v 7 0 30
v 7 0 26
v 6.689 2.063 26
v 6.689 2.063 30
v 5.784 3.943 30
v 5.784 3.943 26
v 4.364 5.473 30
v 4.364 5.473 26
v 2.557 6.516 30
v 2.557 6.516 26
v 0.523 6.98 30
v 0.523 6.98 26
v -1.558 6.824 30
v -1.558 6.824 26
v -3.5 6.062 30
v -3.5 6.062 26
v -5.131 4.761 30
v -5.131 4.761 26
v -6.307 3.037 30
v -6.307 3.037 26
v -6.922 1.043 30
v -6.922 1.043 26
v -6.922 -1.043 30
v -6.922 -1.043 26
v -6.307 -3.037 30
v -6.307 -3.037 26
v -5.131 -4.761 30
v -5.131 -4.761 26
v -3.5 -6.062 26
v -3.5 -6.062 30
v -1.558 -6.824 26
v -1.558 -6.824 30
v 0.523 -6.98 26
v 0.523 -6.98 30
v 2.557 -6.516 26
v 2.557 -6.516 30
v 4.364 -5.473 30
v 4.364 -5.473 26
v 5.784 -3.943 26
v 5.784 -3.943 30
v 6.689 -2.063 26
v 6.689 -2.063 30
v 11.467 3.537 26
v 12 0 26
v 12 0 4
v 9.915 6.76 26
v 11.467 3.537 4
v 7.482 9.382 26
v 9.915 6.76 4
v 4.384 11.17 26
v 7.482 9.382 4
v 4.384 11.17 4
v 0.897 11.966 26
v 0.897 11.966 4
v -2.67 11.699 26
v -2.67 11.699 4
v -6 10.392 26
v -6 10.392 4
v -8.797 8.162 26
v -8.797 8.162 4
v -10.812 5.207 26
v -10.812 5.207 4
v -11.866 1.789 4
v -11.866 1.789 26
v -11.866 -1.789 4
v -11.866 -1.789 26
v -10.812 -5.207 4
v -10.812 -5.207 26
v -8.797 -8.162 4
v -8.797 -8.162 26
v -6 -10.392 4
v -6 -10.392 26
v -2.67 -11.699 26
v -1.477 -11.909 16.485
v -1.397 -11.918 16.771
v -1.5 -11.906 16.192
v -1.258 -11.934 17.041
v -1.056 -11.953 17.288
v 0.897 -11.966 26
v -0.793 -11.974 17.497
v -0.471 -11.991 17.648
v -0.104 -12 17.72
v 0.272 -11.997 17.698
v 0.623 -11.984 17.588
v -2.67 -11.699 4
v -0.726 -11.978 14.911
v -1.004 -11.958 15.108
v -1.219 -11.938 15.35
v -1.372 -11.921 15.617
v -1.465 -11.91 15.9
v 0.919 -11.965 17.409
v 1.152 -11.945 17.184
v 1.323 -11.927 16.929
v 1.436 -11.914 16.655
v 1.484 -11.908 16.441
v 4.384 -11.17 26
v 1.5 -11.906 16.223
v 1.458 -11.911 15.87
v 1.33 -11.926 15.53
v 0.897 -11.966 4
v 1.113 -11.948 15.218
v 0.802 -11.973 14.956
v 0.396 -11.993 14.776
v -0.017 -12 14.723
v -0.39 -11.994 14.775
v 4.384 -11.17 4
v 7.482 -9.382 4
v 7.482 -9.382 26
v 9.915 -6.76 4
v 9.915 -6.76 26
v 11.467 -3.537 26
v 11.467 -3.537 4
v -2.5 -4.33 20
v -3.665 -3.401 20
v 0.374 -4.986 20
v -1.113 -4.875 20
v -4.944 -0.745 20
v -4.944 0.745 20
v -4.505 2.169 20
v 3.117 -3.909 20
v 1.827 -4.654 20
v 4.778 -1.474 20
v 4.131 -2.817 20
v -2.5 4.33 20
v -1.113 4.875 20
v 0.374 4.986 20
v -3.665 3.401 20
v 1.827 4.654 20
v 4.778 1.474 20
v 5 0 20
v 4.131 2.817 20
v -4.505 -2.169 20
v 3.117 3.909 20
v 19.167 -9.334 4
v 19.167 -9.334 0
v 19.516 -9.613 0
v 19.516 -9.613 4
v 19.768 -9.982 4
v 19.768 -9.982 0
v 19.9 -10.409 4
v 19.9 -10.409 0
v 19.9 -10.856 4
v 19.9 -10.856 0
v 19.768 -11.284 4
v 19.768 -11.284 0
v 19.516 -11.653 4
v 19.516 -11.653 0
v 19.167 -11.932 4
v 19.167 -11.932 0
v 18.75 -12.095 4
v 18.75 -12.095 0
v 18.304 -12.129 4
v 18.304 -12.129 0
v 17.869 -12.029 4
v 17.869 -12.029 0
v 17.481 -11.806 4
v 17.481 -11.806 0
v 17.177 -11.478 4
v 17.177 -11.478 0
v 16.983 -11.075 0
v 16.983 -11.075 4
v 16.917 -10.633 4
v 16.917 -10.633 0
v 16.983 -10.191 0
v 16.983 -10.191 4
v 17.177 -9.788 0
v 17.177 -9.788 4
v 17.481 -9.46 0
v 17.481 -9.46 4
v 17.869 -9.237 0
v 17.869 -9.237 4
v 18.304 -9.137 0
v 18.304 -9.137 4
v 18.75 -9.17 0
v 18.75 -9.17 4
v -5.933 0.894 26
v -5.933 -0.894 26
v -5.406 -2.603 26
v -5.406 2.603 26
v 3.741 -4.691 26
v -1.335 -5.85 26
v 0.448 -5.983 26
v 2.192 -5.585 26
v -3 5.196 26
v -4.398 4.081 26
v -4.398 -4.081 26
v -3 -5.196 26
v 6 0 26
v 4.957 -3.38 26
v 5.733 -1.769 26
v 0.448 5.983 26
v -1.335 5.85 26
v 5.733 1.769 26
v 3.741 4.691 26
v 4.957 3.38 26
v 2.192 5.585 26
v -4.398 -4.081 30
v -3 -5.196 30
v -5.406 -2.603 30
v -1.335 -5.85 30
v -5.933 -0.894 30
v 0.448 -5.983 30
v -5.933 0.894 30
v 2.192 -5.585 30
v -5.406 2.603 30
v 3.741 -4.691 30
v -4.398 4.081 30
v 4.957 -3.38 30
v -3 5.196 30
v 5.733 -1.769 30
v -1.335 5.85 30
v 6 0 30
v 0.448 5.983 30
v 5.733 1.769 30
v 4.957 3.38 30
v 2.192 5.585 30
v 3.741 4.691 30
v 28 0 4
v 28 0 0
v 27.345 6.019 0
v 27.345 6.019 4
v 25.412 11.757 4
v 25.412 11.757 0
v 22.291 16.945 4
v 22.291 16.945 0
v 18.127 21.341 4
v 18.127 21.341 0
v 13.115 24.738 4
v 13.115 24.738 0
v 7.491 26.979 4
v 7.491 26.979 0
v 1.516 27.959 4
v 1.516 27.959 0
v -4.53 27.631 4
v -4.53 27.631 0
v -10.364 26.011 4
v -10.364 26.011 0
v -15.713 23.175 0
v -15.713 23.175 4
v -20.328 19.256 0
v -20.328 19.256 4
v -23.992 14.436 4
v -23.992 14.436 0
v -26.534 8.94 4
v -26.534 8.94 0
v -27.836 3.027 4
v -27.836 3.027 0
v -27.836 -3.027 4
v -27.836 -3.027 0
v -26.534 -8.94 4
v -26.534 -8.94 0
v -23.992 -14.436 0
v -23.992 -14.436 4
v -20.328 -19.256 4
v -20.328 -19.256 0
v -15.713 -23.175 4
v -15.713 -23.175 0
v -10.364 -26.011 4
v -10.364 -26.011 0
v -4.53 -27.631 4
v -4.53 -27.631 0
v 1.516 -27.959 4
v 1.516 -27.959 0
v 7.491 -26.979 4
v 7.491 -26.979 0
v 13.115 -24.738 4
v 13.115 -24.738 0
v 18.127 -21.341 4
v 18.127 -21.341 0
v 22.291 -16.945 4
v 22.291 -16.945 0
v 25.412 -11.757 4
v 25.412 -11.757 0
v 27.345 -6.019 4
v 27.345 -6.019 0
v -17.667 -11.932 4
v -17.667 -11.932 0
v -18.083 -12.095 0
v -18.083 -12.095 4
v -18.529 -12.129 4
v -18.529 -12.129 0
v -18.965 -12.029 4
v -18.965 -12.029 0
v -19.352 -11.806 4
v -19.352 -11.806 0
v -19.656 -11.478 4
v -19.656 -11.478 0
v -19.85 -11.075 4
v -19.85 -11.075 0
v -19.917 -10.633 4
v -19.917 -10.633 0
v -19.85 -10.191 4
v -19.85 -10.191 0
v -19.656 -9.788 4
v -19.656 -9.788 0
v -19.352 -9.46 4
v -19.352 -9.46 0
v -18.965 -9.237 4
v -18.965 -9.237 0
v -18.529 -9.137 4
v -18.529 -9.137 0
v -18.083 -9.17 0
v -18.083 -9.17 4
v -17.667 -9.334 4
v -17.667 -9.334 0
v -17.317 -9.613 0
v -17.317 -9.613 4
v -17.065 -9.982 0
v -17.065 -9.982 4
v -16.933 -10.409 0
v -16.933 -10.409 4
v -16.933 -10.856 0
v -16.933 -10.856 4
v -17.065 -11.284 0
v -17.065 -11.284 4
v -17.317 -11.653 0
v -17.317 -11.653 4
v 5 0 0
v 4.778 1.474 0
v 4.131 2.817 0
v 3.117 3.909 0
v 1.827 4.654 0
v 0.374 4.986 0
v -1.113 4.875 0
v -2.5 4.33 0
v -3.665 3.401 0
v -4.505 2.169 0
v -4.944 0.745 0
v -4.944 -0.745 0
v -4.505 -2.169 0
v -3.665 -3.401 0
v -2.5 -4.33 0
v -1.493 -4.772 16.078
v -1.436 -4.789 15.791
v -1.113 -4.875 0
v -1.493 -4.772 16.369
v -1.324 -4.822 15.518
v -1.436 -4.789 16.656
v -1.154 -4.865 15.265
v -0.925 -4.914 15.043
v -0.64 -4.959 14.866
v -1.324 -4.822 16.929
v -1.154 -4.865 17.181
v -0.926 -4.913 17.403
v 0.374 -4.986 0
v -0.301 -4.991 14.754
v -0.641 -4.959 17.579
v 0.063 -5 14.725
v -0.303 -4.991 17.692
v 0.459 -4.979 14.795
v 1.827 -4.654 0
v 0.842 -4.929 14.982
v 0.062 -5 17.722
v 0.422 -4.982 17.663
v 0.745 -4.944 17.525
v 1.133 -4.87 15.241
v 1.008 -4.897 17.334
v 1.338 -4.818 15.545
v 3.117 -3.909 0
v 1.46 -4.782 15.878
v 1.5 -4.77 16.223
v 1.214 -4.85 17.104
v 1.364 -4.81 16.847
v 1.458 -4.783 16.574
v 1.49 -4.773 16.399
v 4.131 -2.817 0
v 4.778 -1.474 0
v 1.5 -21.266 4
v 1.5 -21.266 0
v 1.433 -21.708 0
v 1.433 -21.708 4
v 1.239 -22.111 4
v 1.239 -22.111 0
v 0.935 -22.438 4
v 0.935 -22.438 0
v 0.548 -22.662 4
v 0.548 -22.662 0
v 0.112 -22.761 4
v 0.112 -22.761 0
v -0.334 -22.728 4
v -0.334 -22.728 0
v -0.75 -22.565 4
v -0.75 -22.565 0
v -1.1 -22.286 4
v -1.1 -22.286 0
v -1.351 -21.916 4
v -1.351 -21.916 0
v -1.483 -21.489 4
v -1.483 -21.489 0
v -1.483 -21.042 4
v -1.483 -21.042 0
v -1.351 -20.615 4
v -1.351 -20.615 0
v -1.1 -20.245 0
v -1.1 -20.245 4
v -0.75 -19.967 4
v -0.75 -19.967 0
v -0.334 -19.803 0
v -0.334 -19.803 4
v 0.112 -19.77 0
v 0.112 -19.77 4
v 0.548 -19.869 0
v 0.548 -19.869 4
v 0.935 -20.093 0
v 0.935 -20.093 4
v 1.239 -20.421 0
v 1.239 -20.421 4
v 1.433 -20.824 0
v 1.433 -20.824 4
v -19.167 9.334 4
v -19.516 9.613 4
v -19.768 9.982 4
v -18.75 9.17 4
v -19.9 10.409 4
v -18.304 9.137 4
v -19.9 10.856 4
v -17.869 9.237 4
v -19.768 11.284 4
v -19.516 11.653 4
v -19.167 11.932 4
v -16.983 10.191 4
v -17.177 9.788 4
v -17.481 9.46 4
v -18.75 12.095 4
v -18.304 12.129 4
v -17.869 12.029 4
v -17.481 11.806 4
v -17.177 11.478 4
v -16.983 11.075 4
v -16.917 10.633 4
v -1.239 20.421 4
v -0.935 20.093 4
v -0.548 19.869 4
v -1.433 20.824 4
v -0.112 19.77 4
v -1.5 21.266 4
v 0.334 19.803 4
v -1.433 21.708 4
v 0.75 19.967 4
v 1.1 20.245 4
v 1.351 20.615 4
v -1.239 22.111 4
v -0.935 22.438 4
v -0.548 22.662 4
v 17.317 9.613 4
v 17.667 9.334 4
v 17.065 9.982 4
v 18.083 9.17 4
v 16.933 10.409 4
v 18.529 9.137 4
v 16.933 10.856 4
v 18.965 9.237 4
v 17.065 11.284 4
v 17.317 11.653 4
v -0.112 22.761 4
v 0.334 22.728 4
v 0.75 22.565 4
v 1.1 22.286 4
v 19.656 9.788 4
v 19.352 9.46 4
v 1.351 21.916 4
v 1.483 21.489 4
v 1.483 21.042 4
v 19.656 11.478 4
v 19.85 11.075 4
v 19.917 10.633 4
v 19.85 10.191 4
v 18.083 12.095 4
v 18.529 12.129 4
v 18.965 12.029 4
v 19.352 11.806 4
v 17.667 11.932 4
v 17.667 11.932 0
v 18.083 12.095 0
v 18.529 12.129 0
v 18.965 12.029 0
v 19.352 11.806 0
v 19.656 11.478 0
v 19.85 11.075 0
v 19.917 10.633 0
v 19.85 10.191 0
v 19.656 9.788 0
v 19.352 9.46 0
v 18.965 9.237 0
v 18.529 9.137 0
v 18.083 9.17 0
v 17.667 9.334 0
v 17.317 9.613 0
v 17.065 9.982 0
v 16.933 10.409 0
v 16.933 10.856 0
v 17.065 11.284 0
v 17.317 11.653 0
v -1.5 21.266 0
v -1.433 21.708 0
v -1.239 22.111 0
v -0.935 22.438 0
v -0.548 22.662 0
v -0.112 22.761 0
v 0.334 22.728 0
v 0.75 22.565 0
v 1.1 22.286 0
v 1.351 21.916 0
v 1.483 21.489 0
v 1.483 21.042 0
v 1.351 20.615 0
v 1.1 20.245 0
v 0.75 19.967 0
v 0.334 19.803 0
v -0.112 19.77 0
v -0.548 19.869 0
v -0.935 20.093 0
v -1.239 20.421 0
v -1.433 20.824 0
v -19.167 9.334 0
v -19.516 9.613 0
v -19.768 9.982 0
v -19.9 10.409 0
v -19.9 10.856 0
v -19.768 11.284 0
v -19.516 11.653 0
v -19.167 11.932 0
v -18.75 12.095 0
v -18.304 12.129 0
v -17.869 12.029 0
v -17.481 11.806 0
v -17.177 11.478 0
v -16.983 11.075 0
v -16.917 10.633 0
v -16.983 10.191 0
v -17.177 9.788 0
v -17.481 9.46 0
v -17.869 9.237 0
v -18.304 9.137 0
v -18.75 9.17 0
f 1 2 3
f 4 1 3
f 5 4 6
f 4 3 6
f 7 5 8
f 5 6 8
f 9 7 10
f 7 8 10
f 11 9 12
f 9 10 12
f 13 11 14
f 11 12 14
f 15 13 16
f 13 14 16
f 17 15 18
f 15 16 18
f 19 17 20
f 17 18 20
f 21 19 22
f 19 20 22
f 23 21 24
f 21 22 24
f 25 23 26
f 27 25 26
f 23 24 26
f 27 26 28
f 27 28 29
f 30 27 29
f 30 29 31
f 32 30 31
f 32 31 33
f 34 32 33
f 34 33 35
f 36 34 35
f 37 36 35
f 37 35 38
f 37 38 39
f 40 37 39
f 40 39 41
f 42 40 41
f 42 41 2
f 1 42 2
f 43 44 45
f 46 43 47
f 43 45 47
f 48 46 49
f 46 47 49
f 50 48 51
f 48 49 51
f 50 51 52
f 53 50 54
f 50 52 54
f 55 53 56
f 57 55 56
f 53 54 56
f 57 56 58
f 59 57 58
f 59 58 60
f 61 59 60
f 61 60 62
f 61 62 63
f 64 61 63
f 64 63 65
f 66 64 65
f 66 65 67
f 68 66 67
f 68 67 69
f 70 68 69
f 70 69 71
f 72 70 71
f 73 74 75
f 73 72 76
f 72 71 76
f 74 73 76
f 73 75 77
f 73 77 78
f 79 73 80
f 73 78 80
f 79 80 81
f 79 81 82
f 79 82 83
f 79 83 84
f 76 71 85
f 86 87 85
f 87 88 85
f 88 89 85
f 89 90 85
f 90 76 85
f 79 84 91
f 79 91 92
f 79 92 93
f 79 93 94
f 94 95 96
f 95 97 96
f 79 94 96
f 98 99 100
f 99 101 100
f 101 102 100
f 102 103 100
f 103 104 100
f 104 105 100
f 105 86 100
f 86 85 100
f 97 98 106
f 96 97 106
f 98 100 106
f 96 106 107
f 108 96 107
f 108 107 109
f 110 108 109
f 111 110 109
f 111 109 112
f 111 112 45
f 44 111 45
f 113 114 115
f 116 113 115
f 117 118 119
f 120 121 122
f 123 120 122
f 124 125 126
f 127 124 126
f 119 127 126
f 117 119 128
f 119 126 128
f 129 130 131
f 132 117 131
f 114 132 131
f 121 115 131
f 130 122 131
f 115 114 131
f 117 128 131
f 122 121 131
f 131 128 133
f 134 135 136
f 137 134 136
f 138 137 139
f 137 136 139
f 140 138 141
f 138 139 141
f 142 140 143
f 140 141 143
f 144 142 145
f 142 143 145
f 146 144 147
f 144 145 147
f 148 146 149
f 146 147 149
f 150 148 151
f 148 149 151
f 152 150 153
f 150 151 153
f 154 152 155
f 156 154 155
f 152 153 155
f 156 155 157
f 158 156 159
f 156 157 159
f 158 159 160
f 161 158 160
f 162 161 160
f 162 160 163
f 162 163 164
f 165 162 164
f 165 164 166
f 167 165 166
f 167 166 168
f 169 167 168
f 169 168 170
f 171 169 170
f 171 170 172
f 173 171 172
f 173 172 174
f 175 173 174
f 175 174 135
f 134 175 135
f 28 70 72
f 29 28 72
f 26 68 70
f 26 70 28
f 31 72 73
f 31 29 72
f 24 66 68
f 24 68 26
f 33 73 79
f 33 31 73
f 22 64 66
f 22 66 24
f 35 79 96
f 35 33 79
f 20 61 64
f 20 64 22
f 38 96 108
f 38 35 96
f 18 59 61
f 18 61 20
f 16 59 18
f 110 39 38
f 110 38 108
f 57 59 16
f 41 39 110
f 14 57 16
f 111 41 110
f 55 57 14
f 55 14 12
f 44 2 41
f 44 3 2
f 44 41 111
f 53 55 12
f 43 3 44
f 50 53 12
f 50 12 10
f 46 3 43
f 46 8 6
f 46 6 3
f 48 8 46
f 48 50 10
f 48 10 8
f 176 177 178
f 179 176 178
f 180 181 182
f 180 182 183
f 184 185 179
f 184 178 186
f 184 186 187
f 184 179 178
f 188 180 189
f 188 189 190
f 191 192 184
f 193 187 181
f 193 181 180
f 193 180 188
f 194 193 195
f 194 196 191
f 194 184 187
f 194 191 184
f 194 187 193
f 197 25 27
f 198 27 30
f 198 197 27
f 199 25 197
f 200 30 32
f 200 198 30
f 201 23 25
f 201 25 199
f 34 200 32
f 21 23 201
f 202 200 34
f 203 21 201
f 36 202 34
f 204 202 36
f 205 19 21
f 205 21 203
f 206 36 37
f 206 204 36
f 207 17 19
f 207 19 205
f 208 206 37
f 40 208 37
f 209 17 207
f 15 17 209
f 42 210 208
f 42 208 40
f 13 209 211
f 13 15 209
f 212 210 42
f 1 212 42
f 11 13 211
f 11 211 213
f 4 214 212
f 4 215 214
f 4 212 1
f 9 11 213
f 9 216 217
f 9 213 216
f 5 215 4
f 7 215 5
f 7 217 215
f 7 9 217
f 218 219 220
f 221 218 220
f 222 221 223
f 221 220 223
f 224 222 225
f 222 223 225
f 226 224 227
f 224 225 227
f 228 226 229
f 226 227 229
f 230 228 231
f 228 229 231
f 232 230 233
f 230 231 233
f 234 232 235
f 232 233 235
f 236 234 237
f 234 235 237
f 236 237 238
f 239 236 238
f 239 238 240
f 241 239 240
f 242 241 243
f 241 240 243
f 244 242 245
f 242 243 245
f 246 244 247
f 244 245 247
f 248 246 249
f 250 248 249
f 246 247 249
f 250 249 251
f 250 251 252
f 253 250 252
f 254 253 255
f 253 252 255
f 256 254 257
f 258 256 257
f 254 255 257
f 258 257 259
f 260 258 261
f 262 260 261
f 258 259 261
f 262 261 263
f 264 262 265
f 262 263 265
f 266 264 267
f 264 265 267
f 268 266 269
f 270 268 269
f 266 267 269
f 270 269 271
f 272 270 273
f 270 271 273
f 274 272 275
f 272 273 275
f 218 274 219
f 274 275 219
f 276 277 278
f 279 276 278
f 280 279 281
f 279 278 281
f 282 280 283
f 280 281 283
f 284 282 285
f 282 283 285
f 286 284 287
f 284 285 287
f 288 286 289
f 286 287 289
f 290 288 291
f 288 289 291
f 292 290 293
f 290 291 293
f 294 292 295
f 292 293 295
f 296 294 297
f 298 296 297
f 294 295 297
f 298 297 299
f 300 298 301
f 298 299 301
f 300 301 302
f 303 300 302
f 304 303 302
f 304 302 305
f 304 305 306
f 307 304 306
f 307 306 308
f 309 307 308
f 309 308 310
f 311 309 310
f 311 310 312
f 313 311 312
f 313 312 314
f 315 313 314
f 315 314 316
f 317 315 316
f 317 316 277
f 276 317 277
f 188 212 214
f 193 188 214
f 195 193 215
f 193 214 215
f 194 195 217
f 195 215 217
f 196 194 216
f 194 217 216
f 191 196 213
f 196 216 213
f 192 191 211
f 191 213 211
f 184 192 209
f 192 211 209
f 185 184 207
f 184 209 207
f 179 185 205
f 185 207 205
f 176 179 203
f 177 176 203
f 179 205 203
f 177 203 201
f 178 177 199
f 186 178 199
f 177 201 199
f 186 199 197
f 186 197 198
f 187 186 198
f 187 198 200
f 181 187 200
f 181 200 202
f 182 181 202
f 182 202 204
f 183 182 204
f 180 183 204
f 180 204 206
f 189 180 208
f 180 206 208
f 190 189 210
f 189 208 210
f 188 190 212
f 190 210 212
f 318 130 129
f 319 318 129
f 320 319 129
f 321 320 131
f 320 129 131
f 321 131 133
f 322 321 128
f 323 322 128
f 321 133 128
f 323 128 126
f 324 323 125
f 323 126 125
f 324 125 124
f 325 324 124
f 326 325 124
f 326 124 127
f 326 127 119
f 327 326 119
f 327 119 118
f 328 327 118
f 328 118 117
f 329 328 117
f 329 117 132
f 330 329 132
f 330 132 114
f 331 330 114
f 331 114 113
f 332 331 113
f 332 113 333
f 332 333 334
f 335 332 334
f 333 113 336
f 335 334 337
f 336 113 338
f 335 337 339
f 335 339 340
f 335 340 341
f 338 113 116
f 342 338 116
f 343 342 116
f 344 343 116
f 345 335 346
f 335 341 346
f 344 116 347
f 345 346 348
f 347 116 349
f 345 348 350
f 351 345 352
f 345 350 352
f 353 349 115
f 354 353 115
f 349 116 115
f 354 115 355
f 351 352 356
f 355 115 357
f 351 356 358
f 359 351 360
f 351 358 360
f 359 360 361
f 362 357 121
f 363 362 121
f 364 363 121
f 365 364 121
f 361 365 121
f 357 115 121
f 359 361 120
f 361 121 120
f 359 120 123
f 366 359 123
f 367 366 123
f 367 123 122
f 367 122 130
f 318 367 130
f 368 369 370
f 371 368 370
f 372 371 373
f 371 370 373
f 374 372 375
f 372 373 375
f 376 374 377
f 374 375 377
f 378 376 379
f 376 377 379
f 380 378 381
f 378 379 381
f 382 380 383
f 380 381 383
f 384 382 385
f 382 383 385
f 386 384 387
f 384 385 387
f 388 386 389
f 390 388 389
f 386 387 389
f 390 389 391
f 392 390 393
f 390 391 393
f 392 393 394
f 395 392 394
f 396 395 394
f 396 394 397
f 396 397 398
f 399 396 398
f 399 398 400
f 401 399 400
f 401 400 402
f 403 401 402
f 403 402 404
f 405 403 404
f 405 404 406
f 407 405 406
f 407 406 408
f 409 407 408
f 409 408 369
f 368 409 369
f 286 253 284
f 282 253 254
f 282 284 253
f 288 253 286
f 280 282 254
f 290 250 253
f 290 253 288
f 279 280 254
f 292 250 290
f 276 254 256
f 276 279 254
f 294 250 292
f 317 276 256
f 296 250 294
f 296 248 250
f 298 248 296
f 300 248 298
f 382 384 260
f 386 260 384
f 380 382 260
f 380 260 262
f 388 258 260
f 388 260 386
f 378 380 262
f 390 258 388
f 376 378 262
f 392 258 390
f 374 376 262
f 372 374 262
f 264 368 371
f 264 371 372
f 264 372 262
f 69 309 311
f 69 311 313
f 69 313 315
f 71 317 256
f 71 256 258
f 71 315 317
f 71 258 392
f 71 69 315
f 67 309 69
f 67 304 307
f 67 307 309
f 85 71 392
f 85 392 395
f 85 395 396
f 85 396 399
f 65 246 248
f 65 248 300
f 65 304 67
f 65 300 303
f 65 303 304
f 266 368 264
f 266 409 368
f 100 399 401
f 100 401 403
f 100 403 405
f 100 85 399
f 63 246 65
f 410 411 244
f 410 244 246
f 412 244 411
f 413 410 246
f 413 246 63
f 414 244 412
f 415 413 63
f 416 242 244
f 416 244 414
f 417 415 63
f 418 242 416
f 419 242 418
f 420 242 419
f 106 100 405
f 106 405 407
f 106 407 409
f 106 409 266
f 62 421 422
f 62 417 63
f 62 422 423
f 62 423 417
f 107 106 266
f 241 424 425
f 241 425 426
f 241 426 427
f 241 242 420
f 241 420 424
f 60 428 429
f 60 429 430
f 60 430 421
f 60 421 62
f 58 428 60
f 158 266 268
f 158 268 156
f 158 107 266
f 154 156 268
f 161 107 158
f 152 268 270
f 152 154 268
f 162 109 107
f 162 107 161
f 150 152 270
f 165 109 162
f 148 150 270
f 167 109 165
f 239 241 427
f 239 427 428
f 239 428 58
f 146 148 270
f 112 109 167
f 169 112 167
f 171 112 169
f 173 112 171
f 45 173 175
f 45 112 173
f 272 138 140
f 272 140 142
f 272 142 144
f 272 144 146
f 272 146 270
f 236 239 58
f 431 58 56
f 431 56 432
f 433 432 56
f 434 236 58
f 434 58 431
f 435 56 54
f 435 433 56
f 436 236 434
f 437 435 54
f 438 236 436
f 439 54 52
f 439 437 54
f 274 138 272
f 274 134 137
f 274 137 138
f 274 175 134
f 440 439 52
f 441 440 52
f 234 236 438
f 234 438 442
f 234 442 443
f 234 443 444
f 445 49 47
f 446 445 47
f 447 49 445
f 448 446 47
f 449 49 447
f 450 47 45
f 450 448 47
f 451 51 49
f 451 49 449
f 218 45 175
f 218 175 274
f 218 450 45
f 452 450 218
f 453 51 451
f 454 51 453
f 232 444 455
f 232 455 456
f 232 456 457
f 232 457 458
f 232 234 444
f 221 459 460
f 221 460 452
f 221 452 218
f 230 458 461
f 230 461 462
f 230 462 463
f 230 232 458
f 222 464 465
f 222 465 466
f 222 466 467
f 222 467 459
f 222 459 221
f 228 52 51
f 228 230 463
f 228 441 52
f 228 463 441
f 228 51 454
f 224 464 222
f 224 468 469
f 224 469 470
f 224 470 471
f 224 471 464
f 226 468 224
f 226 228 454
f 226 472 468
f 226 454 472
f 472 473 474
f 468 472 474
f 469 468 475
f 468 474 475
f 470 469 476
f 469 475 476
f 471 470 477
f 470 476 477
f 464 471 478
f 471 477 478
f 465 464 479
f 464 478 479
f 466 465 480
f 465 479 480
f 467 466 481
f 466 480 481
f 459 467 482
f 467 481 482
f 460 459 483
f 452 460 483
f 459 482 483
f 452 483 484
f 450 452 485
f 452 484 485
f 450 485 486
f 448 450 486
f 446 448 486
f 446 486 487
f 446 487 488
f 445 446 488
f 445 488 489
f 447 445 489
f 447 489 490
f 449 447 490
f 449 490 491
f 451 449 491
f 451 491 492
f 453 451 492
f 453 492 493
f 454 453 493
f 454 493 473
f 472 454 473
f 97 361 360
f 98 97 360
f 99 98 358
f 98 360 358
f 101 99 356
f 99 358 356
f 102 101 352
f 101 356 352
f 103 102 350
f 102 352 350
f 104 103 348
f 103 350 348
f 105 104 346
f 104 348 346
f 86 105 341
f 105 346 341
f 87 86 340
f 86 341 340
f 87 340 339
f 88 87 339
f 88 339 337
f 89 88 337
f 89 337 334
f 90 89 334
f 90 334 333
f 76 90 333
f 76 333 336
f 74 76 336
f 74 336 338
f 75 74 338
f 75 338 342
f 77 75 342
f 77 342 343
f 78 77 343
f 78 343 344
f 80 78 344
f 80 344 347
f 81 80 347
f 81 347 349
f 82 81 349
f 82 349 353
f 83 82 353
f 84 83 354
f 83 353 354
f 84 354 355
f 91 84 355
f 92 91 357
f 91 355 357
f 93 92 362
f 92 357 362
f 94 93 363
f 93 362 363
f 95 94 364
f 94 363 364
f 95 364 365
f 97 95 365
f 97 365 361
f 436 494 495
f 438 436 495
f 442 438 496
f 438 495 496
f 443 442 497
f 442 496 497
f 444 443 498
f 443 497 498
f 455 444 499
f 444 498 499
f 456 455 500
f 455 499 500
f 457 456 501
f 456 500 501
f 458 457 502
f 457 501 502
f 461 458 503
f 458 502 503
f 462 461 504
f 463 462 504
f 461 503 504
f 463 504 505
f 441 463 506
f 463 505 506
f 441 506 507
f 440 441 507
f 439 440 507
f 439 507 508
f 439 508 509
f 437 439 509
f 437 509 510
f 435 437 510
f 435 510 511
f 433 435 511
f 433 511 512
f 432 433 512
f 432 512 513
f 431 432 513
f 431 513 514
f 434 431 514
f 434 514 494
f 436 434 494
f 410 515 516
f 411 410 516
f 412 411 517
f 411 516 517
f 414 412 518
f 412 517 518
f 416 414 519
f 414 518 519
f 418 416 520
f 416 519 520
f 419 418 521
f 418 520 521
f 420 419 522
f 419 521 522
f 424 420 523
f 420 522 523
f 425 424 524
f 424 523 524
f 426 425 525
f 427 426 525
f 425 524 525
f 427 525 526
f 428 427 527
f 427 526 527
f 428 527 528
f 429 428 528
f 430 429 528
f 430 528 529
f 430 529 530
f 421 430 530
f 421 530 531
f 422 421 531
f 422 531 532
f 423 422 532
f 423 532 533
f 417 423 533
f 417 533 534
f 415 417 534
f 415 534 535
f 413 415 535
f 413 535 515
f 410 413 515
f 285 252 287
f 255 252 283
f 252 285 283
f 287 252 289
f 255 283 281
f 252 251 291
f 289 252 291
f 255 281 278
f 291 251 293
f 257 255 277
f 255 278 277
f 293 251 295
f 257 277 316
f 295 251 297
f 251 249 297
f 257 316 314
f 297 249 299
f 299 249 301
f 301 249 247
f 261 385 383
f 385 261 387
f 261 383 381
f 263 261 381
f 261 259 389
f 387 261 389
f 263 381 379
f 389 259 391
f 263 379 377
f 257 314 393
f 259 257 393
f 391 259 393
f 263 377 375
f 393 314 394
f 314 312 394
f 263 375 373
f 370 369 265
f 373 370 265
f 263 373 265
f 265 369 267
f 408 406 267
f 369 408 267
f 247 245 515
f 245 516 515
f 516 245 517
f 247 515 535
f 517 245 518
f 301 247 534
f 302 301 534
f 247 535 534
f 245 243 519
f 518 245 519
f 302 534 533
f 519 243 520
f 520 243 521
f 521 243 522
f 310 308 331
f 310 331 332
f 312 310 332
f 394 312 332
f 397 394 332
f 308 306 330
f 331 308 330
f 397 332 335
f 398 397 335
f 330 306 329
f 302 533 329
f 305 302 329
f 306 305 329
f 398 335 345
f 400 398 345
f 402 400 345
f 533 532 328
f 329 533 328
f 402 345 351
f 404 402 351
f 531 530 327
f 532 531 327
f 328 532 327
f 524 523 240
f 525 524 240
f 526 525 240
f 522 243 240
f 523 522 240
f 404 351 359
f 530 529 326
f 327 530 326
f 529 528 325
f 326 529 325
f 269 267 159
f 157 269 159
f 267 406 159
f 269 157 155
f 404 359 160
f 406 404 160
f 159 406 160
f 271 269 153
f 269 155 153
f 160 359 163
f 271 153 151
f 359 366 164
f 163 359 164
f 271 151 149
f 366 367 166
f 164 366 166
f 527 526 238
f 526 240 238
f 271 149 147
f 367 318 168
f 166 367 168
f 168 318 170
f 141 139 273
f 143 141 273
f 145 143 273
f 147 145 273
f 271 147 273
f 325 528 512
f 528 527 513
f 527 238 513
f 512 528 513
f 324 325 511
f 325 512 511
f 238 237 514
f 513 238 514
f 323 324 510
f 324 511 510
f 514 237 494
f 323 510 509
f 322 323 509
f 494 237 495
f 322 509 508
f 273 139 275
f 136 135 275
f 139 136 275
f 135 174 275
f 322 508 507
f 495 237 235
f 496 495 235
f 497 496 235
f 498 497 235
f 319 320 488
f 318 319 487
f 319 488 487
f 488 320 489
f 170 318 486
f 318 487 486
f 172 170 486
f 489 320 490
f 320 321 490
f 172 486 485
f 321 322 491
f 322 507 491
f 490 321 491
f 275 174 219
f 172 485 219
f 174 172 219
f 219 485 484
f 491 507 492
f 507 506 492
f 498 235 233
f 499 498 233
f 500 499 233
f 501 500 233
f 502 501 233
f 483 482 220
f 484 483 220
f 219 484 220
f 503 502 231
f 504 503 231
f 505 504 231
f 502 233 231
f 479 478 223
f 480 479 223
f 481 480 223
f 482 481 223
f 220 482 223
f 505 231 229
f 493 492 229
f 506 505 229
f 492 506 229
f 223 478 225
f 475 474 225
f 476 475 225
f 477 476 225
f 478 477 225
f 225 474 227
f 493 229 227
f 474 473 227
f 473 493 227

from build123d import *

# Parameters (mm, degrees)
SKETCH_1_R               = 28
EXTRUDE_1_DEPTH          = 4
SKETCH_2_R               = 12
EXTRUDE_2_DEPTH          = 22
SKETCH_3_R               = 5
CUT_EXTRUDE_1_DEPTH      = 60
SKETCH_4_R               = 1.5
CUT_EXTRUDE_2_DEPTH      = 7
PATTERN_CIRCULAR_1_COUNT = 6
SKETCH_5_R               = 1.5
CUT_EXTRUDE_3_DEPTH      = 15
SKETCH_7_R               = 7
EXTRUDE_4_DEPTH          = 10
SKETCH_8_R               = 6
CUT_EXTRUDE_4_DEPTH      = 4


with BuildPart() as part:
    # 草图1 → 凸台-拉伸1 (new body)
    with BuildSketch(Plane.XY):
        Circle(SKETCH_1_R)
    extrude(amount=EXTRUDE_1_DEPTH)

    # 草图2 → 凸台-拉伸2 (add)
    with BuildSketch(Plane.XY.offset(4)):
        Circle(SKETCH_2_R)
    extrude(amount=EXTRUDE_2_DEPTH)

    # 草图3 → 切除-拉伸1 (cut)
    with BuildSketch(Plane.XY.offset(26)):
        Circle(SKETCH_3_R)
    extrude(amount=-CUT_EXTRUDE_1_DEPTH, mode=Mode.SUBTRACT)

    # 草图4 → 切除-拉伸2 (cut)
    with BuildSketch(Plane(origin=(0, 0, 0), x_dir=(-1, 0, 0), z_dir=(0, 0, -1))):
        with Locations((0, 21.265645264)):
            Circle(SKETCH_4_R)
    cut_extrude_2 = extrude(amount=-CUT_EXTRUDE_2_DEPTH, mode=Mode.SUBTRACT)

    # 阵列(圆周)1: 切除-拉伸2 ×6 about axis
    pattern_circular_1_axis = Axis((0, 0, -1.3), (0, 0, 1))
    for i in range(1, PATTERN_CIRCULAR_1_COUNT):
        add(cut_extrude_2.rotate(pattern_circular_1_axis, i * 360 / PATTERN_CIRCULAR_1_COUNT), mode=Mode.SUBTRACT)

    # 草图5 → 切除-拉伸3 (cut)
    with BuildSketch(Plane(origin=(0, 0, 0), x_dir=(1, 0, 0), z_dir=(0, 1, 0))):
        with Locations((0, -16.223306721)):
            Circle(SKETCH_5_R)
    extrude(amount=-CUT_EXTRUDE_3_DEPTH, mode=Mode.SUBTRACT)

    # 草图7 → 凸台-拉伸4 (add)
    with BuildSketch(Plane.XY.offset(20)):
        Circle(SKETCH_7_R)
    extrude(amount=EXTRUDE_4_DEPTH)

    # 草图8 → 切除-拉伸4 (cut)
    with BuildSketch(Plane.XY.offset(30)):
        Circle(SKETCH_8_R)
    extrude(amount=-CUT_EXTRUDE_4_DEPTH, mode=Mode.SUBTRACT)


solid = part.part
